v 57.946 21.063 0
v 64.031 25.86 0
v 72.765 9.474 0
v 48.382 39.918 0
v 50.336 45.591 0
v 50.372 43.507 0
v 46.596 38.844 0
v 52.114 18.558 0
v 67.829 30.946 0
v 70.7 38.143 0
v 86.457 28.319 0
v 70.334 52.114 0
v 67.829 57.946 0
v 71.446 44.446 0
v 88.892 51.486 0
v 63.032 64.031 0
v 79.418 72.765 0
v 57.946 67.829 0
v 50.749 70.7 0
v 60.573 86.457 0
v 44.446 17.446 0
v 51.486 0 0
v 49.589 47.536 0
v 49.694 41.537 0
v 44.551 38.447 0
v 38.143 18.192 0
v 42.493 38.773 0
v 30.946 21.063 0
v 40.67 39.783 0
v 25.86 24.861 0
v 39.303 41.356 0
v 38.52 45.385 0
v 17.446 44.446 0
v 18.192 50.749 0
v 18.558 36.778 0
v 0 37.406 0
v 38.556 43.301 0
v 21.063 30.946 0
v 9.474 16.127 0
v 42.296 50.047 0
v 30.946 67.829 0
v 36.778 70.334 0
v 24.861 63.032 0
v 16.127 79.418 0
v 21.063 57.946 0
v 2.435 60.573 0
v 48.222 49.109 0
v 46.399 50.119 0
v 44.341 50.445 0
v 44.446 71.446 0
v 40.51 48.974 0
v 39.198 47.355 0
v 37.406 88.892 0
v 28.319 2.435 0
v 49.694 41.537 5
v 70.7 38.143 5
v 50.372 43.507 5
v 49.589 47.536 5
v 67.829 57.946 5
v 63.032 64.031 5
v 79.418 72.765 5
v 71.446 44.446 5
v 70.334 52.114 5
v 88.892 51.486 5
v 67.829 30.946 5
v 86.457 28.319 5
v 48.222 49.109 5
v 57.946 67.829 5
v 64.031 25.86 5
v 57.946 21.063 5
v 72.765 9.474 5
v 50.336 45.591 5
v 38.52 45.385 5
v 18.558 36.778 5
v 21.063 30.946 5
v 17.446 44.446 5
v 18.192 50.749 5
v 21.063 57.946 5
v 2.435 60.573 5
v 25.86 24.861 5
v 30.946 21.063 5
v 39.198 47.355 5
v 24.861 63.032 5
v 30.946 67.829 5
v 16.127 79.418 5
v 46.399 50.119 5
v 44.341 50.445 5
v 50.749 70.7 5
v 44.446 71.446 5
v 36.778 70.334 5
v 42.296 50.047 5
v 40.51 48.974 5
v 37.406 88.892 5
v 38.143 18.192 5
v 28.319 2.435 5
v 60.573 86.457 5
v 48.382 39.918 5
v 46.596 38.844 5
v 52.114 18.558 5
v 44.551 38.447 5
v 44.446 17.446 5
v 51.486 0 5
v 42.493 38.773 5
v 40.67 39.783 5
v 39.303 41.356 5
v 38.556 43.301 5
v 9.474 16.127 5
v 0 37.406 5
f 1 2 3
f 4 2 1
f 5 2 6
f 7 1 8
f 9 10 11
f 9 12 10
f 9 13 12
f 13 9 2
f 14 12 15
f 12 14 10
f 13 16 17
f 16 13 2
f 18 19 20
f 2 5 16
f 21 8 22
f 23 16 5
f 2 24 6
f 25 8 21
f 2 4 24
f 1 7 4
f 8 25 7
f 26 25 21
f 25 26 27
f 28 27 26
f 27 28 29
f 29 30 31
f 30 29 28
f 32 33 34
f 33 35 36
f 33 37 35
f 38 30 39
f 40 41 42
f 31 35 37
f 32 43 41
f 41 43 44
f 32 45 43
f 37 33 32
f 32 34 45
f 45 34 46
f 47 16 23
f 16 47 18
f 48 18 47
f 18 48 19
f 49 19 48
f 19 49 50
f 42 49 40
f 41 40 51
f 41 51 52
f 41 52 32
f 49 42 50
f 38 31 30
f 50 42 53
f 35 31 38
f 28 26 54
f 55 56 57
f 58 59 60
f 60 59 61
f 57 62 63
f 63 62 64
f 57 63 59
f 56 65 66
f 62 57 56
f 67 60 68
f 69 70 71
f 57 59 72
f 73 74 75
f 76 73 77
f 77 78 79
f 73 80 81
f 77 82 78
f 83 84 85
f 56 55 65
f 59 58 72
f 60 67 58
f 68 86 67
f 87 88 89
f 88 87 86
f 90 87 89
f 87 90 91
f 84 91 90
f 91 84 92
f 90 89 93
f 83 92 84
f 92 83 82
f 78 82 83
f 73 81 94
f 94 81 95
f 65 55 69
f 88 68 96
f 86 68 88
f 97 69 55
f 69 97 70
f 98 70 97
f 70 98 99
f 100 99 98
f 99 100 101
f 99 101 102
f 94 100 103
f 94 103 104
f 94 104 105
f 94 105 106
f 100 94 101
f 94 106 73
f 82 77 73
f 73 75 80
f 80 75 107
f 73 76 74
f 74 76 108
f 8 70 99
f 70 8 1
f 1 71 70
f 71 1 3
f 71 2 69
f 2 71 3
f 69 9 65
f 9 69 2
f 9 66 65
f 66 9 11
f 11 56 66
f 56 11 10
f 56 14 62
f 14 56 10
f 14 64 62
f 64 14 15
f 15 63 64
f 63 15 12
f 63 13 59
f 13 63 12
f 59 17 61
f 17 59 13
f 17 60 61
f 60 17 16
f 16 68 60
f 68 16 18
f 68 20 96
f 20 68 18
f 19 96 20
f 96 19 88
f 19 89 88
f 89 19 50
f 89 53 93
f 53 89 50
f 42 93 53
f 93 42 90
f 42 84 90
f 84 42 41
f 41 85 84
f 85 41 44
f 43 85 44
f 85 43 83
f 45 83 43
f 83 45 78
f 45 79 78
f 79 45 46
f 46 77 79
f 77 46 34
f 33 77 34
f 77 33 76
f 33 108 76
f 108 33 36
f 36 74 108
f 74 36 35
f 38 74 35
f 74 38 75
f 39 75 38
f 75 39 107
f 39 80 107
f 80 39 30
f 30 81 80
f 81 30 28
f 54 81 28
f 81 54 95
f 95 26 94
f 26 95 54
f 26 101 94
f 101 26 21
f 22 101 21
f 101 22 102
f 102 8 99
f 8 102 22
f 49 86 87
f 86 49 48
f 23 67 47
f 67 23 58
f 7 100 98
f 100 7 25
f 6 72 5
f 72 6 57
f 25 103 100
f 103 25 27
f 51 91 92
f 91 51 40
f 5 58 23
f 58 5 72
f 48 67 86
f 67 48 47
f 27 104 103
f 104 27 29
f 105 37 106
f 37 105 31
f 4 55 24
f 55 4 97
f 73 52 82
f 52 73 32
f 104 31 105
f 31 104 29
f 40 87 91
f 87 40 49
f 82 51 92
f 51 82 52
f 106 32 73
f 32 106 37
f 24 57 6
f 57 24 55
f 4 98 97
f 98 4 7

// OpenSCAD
$fn = 32;

// ----------------------------------------------------------------------
// Star wheel: 12-point ratchet, R45
// ----------------------------------------------------------------------

// --- parameters (mm) ---
n_points = 12;            // number of points / teeth
r_out = 45;               // tip radius
r_in = 27;                // root radius
bore_r = 6;               // centre bore radius
plate_t = 5;              // plate thickness, Z (extrusion height)
bore_d = 12;              // centre bore diameter

profile = [[17.446, 44.446], [0, 37.406], [18.558, 36.778], [21.063, 30.946], [9.474, 16.127], [25.86, 24.861], [30.946, 21.063], [28.319, 2.435], [38.143, 18.192], [44.446, 17.446], [51.486, 0], [52.114, 18.558], [57.946, 21.063], [72.765, 9.474], [64.031, 25.86], [67.829, 30.946], [86.457, 28.319], [70.7, 38.143], [71.446, 44.446], [88.892, 51.486], [70.334, 52.114], [67.829, 57.946], [79.418, 72.765], [63.032, 64.031], [57.946, 67.829], [60.573, 86.457], [50.749, 70.7], [44.446, 71.446], [37.406, 88.892], [36.778, 70.334], [30.946, 67.829], [16.127, 79.418], [24.861, 63.032], [21.063, 57.946], [2.435, 60.573], [18.192, 50.749]];  // primary outline, 36 points, counter clockwise
void_1 = [[50.336, 45.591], [49.589, 47.536], [48.222, 49.109], [46.399, 50.119], [44.341, 50.445], [42.296, 50.047], [40.51, 48.974], [39.198, 47.355], [38.52, 45.385], [38.556, 43.301], [39.303, 41.356], [40.67, 39.783], [42.493, 38.773], [44.551, 38.447], [46.596, 38.844], [48.382, 39.918], [49.694, 41.537], [50.372, 43.507]];  // centre bore, 18 points

// --- the one profile operation ---
difference() {
  linear_extrude(height = plate_t) polygon(points = profile);
  translate([0, 0, -1])
    linear_extrude(height = plate_t + 2) polygon(points = void_1);
}
